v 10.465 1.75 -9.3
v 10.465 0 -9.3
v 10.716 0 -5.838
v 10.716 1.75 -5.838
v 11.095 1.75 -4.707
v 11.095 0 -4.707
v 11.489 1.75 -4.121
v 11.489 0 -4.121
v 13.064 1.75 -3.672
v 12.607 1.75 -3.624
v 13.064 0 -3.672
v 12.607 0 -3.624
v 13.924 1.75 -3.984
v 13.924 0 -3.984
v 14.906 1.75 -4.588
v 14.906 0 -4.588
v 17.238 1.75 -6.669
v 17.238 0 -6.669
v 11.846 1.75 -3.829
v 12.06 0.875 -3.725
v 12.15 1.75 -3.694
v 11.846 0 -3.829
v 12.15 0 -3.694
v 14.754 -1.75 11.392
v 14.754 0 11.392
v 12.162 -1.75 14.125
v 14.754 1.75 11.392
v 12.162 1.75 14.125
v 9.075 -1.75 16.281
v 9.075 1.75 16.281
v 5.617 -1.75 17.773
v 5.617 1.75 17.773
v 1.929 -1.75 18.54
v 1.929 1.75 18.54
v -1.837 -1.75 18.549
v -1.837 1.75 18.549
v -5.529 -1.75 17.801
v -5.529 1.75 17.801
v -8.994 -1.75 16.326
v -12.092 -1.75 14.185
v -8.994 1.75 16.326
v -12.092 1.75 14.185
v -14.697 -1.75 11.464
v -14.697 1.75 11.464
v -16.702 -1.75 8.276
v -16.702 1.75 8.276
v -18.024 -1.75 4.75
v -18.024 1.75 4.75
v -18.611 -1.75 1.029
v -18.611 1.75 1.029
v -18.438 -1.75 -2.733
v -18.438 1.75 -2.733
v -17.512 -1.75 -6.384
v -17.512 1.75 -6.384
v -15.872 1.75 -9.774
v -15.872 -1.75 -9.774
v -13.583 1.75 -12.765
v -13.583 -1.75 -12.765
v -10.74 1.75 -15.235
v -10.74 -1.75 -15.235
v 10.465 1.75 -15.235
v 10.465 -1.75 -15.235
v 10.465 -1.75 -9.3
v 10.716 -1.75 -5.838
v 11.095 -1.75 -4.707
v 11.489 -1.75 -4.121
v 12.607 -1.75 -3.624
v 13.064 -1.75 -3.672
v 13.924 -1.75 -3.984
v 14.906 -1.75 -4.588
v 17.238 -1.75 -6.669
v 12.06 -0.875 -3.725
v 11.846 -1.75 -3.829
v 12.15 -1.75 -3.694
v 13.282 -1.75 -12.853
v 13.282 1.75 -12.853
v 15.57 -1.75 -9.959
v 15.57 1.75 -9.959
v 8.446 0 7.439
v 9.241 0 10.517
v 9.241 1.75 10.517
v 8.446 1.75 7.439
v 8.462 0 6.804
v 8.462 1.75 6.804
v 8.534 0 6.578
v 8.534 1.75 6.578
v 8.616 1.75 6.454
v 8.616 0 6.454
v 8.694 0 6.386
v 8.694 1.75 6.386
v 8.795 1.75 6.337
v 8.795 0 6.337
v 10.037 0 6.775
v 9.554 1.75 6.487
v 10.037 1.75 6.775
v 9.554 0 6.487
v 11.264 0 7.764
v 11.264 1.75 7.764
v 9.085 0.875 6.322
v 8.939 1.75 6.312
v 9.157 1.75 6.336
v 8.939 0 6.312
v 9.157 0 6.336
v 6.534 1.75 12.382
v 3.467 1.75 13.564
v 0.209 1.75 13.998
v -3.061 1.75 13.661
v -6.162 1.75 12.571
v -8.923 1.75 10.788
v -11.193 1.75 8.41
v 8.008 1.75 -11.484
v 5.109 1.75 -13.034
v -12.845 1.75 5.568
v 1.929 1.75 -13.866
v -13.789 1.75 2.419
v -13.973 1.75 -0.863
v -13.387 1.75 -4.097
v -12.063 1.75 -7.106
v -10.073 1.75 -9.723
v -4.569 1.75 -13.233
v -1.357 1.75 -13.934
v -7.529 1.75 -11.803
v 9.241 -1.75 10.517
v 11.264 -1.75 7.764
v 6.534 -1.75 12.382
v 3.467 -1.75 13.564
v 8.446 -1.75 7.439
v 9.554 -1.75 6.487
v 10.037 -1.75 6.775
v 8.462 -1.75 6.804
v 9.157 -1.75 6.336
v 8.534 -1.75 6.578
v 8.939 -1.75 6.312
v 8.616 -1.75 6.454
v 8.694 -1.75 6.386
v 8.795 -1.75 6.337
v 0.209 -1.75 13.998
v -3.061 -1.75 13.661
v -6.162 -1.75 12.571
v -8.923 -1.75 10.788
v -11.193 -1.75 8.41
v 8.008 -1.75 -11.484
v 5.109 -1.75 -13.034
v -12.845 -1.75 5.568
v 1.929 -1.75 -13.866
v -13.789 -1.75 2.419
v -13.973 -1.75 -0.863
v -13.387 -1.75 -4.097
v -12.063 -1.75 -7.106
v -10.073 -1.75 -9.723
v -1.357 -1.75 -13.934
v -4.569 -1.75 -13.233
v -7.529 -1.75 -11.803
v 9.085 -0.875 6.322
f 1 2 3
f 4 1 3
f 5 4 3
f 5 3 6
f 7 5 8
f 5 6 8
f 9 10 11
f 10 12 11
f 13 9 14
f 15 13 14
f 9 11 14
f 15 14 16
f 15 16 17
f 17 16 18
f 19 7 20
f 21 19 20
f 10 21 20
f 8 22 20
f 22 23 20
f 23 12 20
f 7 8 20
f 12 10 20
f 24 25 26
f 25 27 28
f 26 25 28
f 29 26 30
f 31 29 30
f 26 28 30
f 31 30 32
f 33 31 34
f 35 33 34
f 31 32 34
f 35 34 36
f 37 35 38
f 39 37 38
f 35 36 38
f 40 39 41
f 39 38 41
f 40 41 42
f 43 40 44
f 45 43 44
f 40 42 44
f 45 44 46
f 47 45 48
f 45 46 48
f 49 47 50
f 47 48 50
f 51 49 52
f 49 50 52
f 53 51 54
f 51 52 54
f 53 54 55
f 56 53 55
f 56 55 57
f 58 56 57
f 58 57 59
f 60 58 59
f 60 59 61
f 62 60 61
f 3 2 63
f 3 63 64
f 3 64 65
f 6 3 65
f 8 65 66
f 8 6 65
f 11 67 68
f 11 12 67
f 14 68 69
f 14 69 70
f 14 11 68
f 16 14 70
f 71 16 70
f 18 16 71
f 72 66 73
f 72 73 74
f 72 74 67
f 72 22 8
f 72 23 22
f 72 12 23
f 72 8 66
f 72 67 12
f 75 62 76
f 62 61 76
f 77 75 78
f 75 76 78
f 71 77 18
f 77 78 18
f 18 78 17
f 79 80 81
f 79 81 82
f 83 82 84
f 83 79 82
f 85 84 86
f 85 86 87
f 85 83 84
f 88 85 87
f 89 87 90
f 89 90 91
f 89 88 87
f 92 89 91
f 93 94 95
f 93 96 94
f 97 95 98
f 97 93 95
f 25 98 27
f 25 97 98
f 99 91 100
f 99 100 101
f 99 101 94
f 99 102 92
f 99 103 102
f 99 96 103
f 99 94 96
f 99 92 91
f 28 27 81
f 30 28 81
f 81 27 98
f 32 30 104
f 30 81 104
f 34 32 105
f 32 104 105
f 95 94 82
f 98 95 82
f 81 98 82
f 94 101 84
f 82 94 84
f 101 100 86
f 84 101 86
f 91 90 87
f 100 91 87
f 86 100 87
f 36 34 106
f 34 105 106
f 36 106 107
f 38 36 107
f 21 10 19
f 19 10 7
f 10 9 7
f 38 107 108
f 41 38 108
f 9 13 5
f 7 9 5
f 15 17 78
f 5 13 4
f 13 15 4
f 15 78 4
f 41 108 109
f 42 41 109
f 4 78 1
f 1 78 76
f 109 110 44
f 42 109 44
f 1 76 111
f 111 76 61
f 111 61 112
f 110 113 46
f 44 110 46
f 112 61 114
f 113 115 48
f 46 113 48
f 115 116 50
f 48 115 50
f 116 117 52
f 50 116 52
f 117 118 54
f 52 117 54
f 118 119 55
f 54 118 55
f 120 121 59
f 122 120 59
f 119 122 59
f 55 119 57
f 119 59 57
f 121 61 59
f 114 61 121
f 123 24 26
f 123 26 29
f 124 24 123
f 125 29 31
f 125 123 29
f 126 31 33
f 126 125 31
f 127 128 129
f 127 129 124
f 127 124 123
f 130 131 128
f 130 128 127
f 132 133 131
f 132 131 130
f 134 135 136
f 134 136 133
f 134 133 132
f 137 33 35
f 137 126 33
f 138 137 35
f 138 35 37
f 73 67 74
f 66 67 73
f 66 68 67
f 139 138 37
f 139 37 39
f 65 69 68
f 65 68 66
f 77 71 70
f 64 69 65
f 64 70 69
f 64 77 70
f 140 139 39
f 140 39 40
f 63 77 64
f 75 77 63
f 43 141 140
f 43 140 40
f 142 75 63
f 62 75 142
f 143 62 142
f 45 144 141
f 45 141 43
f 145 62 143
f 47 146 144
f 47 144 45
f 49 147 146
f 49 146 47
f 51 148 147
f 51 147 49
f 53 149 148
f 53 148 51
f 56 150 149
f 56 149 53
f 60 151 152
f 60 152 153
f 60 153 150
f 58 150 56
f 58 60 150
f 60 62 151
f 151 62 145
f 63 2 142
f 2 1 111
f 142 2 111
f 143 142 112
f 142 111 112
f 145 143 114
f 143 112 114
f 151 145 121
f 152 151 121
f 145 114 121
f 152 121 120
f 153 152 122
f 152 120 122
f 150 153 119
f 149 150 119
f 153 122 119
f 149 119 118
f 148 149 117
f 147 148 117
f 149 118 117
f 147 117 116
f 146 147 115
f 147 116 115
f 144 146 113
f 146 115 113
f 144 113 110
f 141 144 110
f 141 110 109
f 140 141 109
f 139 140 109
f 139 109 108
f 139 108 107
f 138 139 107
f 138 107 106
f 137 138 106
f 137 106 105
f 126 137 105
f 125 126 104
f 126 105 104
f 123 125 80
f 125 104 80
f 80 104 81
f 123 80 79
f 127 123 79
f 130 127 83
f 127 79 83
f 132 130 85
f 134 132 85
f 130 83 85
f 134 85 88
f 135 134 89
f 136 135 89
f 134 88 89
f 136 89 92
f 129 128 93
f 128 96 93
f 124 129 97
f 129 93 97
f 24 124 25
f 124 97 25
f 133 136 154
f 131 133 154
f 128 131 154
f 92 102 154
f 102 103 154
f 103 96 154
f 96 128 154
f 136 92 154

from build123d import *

# Parameters (mm, degrees)
BOSS_EXTRUDE6_DEPTH = 1.75


with BuildPart() as part:
    # Sketch2 → Boss-Extrude6 (new, symmetric)
    with BuildSketch(Plane(origin=(0, 0, 0), x_dir=(1, 0, 0), z_dir=(0, 1, 0))):
        with BuildLine():
            Line((-10.739531219, 15.234845975), (10.464592886, 15.234845975))
            ThreePointArc((10.464592886, 15.234845975), (14.498154651, 11.463496319), (17.237579405, 6.668889894))
            add(Edge.make_bspline(
                [(10.464592886, 9.300123426), (10.269158267, -0.534114199), (17.237579405, 6.668889894)],
                knots=[0, 0, 0, 1, 1, 1], degree=2))
            ThreePointArc((10.464592886, 9.300123426), (-13.973393874, 0.862707152), (9.241114219, -10.516739418))
            add(Edge.make_bspline(
                [(9.241114219, -10.516739418), (6.173157196, -1.690016533), (14.753630457, -11.391595632)],
                knots=[0, 0, 0, 1, 1, 1], degree=2))
            ThreePointArc((14.753630457, -11.391595632), (-13.463658356, -12.890615438), (-10.739531219, 15.234845975))
        make_face()
    extrude(amount=BOSS_EXTRUDE6_DEPTH, both=True)


solid = part.part
